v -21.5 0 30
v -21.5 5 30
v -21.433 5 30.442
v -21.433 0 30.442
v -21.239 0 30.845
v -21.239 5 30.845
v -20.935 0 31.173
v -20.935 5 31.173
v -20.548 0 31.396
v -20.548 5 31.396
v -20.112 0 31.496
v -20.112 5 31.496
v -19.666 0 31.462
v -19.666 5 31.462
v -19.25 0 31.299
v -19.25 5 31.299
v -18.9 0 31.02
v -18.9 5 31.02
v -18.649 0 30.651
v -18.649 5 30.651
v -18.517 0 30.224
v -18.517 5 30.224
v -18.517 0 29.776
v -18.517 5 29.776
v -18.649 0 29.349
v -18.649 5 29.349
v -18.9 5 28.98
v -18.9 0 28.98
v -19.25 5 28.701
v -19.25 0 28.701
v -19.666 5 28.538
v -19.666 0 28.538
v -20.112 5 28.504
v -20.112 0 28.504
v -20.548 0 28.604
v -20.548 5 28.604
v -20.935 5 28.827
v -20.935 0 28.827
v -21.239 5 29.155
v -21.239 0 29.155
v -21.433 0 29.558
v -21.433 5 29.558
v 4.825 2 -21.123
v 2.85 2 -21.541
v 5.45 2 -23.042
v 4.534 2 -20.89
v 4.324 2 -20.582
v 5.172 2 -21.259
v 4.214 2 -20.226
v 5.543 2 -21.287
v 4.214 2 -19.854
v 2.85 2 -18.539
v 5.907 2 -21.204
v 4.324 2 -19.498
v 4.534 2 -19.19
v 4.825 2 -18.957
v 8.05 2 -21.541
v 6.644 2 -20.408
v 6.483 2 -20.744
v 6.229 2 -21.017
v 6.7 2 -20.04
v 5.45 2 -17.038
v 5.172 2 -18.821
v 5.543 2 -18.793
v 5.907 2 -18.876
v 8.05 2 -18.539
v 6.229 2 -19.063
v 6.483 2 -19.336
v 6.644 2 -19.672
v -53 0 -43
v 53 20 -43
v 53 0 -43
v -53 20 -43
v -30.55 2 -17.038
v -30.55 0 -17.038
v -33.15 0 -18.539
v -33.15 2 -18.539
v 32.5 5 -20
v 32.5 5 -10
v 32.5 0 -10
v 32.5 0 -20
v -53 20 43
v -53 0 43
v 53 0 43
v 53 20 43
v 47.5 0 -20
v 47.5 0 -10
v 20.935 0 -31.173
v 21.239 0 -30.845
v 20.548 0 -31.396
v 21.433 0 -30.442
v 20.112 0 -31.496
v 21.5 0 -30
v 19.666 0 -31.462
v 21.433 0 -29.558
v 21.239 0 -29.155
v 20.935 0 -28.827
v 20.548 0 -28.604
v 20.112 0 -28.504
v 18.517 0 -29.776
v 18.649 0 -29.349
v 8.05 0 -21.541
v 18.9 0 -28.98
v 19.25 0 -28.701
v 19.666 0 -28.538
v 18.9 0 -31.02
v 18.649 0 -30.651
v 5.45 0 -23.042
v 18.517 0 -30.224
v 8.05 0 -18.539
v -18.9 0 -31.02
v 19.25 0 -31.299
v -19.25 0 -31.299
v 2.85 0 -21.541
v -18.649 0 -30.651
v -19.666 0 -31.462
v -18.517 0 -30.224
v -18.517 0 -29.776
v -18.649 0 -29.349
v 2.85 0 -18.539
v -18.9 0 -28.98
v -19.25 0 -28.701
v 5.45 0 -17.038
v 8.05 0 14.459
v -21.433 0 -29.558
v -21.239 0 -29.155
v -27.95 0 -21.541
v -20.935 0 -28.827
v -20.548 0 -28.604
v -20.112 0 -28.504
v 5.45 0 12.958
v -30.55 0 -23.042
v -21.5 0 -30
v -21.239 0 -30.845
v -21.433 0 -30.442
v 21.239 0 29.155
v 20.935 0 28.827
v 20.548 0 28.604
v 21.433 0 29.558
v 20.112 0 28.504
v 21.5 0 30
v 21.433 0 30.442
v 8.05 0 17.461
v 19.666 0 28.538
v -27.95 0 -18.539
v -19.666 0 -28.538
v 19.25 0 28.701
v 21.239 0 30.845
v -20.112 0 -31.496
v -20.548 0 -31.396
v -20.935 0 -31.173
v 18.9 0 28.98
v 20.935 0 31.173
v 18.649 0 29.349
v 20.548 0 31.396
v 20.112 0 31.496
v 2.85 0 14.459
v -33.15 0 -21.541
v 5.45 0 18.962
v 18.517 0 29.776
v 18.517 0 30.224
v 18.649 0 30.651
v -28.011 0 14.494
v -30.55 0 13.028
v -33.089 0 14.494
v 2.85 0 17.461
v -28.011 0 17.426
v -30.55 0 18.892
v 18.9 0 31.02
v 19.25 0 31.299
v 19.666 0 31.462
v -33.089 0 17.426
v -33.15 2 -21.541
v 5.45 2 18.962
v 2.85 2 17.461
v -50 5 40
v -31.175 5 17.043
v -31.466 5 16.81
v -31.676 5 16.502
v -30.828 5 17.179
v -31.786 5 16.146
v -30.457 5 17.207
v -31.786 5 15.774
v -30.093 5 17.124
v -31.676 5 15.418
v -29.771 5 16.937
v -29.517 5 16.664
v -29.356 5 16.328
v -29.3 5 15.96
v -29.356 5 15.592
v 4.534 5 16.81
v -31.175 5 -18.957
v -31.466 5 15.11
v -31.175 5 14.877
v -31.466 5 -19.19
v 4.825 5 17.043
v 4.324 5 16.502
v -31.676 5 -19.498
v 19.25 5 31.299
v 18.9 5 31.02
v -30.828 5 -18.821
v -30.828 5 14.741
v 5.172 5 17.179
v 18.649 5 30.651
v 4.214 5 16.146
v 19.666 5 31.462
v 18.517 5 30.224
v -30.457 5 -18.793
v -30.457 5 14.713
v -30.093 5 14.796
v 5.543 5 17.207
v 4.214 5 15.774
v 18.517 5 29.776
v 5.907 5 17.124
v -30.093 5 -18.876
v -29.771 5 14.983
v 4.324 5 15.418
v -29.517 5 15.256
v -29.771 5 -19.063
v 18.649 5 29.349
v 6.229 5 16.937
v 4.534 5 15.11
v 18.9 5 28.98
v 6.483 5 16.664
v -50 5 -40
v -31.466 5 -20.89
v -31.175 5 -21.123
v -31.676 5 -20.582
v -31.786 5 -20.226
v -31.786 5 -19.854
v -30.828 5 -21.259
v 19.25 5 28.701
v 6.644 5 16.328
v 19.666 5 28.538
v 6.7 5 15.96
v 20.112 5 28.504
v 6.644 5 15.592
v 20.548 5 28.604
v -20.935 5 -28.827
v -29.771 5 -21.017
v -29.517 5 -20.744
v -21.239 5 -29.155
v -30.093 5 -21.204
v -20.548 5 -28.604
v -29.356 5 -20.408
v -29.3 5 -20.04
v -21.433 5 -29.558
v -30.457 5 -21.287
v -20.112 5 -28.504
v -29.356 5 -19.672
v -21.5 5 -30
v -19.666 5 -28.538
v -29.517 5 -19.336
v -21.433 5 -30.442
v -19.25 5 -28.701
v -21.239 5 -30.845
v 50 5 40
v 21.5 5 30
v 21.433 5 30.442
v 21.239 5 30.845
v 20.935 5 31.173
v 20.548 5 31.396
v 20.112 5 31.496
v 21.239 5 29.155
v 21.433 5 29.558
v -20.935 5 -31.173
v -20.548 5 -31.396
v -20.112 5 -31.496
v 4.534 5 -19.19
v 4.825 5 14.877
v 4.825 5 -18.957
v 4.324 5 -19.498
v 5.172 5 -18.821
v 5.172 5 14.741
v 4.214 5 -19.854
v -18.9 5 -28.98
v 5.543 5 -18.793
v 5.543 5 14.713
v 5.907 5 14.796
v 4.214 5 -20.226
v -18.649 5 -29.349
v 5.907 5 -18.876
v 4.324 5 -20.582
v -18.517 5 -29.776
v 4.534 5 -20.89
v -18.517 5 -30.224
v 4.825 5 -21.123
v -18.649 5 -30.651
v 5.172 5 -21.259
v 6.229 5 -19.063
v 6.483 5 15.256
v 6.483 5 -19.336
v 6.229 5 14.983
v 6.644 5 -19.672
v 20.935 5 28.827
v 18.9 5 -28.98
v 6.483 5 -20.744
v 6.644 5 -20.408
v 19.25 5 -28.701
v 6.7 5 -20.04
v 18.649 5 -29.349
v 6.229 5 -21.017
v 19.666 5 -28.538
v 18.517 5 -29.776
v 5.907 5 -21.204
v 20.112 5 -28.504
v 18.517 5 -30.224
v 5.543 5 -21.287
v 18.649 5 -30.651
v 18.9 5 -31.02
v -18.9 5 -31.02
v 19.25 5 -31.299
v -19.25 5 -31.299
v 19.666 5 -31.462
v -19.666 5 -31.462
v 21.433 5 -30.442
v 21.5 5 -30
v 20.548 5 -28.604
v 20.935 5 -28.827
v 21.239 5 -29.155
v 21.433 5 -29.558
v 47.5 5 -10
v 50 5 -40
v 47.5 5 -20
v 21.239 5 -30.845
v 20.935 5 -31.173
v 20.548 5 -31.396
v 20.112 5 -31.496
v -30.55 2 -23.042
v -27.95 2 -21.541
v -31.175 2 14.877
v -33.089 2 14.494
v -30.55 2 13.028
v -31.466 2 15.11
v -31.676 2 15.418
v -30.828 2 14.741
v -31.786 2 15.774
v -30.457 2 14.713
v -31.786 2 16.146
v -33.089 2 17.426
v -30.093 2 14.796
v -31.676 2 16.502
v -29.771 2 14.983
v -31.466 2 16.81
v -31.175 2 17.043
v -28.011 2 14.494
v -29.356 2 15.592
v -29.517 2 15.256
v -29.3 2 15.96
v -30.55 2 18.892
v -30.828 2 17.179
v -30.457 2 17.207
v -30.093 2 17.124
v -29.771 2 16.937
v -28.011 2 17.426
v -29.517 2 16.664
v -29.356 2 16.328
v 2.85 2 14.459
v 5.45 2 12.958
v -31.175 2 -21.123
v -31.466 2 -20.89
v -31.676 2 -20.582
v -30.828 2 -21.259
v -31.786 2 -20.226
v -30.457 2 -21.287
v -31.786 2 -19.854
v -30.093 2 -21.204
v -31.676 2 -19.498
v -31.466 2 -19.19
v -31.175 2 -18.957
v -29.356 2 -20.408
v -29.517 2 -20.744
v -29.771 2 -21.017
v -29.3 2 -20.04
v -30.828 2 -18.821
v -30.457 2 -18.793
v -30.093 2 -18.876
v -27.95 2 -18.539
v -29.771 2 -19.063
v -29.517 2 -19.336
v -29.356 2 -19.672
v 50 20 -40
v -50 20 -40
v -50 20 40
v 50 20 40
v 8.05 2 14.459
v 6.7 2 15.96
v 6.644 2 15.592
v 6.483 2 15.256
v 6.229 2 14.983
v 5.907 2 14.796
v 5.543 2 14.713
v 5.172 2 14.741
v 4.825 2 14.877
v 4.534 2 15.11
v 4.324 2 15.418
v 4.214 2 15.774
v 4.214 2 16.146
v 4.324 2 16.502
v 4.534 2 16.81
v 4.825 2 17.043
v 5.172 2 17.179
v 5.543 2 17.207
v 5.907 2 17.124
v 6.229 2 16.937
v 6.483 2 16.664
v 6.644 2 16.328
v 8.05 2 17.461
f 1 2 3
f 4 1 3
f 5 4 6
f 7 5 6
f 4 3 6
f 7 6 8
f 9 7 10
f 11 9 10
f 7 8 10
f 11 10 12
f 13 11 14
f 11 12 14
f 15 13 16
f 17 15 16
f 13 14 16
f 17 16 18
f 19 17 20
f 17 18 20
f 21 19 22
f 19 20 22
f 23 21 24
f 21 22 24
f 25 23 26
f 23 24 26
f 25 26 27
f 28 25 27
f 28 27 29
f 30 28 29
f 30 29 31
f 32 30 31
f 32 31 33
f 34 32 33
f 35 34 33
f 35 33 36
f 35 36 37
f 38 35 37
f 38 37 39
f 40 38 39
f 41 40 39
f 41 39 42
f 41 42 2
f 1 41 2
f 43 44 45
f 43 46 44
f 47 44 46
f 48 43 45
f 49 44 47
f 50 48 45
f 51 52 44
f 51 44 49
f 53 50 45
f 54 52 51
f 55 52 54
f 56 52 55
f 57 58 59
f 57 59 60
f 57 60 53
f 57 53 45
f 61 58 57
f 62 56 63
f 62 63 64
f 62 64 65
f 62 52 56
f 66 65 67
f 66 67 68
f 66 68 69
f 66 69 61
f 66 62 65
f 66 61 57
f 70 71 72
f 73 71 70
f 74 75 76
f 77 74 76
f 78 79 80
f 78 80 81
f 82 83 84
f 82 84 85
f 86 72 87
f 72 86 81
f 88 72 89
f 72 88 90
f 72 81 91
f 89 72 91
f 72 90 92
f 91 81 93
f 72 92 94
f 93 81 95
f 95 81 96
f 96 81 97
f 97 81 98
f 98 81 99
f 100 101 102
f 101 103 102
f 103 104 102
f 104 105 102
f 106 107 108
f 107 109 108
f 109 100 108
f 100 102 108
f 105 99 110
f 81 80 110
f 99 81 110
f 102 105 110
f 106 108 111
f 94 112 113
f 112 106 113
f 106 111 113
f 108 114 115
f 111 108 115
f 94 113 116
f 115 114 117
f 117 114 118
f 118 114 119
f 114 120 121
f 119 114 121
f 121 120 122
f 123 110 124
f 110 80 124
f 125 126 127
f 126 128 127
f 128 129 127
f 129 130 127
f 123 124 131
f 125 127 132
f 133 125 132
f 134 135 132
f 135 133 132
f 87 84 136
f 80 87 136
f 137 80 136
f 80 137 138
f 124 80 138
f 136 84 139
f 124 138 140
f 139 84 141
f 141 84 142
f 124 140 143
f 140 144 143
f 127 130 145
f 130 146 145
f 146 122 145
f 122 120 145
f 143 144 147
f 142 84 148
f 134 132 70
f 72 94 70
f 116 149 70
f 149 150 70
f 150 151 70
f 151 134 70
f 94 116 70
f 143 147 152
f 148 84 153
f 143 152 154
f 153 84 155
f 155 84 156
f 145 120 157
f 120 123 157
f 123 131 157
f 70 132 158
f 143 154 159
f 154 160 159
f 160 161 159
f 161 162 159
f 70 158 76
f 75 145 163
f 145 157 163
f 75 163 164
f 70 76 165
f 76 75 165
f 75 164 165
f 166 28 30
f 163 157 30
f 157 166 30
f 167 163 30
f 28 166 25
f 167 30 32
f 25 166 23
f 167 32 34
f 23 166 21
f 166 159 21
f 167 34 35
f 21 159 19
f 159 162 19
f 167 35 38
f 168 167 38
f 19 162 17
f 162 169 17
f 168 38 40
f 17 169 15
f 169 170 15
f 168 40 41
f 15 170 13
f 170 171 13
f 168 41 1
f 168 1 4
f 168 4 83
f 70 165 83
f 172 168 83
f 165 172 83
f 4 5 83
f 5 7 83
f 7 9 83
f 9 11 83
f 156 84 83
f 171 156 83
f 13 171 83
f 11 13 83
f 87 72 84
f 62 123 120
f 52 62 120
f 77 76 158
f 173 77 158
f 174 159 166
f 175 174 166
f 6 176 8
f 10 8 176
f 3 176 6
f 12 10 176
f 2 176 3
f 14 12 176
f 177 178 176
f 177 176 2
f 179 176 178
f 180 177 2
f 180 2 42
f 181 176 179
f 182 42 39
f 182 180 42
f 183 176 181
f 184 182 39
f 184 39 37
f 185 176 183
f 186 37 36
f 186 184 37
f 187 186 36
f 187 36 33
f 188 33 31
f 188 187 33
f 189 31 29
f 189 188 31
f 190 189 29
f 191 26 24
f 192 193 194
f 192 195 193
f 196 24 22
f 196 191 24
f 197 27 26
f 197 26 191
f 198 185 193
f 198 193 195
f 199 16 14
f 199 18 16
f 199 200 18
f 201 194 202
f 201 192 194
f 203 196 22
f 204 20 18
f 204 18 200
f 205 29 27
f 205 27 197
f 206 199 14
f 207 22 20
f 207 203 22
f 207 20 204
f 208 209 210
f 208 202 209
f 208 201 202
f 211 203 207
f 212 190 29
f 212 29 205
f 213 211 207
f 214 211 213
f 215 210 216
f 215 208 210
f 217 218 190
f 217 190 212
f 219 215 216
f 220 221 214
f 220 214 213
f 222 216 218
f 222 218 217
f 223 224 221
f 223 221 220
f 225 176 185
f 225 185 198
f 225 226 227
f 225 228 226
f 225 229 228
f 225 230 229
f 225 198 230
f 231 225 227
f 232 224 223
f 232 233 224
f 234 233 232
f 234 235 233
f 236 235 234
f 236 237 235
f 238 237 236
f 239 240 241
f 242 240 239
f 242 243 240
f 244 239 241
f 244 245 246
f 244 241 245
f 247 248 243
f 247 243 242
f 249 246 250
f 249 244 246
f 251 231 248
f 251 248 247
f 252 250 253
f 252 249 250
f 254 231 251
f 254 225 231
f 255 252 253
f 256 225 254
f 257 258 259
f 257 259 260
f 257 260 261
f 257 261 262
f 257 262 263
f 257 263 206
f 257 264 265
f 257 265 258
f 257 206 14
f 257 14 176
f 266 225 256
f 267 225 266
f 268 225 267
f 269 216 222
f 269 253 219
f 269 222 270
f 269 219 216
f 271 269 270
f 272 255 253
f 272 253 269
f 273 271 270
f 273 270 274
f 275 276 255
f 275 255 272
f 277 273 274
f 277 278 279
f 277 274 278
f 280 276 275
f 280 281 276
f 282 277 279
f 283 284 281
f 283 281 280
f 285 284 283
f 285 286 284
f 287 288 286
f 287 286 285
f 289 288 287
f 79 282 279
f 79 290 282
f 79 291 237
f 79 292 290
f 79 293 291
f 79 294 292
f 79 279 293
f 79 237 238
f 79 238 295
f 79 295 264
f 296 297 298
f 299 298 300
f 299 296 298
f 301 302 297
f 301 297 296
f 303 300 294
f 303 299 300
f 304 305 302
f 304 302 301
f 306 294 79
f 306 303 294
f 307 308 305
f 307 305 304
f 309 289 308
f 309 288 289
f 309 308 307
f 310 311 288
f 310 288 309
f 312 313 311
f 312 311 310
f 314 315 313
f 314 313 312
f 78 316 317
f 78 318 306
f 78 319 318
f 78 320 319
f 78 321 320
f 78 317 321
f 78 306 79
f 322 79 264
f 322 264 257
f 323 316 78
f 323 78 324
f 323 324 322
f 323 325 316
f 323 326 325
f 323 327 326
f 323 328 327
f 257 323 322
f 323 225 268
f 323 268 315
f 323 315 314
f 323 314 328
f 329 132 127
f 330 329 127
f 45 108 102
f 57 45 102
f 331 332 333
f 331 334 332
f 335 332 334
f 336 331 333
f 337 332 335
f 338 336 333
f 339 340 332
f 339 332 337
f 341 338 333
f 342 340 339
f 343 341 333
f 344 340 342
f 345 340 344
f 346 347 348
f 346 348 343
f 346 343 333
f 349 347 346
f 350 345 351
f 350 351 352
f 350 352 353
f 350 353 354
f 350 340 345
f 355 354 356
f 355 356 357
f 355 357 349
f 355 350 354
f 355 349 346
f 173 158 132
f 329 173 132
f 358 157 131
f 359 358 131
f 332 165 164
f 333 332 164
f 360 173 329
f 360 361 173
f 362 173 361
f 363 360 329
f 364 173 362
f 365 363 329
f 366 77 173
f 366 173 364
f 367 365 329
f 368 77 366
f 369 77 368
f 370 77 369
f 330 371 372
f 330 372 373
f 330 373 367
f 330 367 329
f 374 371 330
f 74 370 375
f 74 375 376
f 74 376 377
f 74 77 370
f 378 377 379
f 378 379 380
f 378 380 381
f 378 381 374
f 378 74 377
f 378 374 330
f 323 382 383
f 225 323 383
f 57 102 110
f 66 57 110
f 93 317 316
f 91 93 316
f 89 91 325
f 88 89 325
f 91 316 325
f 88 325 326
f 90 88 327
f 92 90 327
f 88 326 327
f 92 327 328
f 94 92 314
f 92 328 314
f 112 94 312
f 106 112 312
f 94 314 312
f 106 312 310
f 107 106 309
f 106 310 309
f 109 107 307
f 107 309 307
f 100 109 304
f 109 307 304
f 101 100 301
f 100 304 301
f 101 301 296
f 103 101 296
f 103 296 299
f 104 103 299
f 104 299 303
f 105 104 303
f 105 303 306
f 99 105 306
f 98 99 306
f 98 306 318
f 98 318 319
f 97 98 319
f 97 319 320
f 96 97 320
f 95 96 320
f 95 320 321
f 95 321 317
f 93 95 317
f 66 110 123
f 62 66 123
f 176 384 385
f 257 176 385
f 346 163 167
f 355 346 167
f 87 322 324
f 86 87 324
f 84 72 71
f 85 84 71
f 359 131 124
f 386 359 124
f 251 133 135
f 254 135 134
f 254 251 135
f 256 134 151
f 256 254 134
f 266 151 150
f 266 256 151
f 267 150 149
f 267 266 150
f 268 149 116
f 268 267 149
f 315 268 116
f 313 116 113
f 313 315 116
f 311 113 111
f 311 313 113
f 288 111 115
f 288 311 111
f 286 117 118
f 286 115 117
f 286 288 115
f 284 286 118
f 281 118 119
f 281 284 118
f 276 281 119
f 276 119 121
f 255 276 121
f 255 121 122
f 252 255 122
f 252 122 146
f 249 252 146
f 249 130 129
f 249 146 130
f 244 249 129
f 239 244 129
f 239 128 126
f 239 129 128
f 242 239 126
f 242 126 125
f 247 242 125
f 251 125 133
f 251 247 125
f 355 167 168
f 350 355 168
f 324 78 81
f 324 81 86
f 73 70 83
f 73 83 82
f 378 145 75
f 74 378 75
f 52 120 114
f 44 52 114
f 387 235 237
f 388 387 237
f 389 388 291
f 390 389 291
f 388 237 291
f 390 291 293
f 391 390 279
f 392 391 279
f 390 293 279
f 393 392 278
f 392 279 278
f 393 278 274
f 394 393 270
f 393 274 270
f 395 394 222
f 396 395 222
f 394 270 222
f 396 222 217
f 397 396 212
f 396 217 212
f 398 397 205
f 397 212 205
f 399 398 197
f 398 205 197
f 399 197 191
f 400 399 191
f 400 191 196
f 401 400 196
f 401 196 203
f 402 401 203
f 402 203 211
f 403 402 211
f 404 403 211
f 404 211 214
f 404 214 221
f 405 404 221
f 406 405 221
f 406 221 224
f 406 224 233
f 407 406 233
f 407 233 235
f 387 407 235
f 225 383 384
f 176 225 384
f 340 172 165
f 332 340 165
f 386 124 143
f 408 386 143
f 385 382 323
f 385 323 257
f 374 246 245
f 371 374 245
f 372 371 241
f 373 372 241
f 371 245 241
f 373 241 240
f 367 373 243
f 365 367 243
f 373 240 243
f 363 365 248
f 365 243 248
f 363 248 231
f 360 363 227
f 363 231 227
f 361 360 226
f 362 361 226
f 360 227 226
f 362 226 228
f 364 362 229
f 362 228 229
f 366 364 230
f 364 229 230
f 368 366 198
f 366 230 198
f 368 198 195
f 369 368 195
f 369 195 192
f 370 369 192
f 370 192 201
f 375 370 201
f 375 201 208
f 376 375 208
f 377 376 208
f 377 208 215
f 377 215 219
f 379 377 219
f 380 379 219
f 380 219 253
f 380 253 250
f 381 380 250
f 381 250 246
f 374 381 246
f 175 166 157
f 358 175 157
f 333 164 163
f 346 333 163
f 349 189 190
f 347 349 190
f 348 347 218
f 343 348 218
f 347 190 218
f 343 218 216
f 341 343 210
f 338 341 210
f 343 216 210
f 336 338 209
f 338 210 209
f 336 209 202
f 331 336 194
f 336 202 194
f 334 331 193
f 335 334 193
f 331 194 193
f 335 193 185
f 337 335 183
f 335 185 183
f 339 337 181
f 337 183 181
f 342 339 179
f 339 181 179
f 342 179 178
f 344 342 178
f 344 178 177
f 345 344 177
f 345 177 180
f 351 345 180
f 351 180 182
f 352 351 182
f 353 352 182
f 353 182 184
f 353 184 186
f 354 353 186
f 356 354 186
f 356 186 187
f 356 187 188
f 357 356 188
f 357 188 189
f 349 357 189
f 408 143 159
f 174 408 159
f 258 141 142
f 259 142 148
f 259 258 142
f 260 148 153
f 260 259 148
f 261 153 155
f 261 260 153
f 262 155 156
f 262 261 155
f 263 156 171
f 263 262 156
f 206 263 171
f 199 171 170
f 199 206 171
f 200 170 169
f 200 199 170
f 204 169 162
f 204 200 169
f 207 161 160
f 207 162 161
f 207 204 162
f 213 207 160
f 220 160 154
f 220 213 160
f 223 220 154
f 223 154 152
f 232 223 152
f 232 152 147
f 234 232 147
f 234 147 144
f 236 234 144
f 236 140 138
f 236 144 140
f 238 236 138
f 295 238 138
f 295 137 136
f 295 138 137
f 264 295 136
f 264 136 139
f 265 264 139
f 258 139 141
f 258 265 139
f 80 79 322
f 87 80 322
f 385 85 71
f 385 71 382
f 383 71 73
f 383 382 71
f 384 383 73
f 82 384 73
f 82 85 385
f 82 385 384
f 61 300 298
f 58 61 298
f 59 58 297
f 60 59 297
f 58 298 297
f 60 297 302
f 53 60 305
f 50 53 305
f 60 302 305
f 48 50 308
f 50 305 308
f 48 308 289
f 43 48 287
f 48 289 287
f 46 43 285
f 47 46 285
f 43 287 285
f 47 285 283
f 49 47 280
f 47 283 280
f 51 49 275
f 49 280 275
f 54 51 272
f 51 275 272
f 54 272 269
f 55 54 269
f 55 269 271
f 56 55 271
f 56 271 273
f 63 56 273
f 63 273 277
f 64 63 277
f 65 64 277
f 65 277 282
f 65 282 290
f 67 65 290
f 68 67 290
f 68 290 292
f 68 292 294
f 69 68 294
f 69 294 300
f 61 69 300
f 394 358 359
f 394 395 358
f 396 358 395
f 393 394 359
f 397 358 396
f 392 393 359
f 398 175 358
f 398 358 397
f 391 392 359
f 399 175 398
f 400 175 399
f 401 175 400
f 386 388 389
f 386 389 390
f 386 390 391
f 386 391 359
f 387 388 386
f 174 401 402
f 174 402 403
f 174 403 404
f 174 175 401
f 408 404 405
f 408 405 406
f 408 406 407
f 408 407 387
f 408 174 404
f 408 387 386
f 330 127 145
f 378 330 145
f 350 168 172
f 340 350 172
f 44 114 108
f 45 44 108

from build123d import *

# Parameters (mm, degrees)
SKETCH_1_W               = 100
SKETCH_1_H               = 80
EXTRUDE_1_DEPTH          = 5
SKETCH_2_R               = 1.5
CUT_EXTRUDE_1_DEPTH      = 6
MIRROR_2_COPY_1_SKETCH_R = 1.5
MIRROR_2_COPY_1_DEPTH    = 6
SKETCH_4_W               = 100
SKETCH_4_H               = 20
EXTRUDE_2_DEPTH          = 3
SKETCH_5_W               = 83
SKETCH_5_H               = 20
EXTRUDE_3_DEPTH          = 3
SKETCH_6_W               = 106
SKETCH_6_H               = 20
EXTRUDE_4_DEPTH          = 3
SKETCH_7_R               = 1.25
CUT_EXTRUDE_2_DEPTH      = 6
CUT_EXTRUDE_3_DEPTH      = 2
SKETCH_9_W               = 15
SKETCH_9_H               = 10
CUT_EXTRUDE_4_DEPTH      = 6


with BuildPart() as part:
    # 草图1 → 凸台-拉伸1 (new body)
    with BuildSketch(Plane(origin=(0, 0, 0), x_dir=(1, 0, 0), z_dir=(0, 1, 0))):
        Rectangle(SKETCH_1_W, SKETCH_1_H)
    extrude(amount=EXTRUDE_1_DEPTH)

    # 草图2 → 切除-拉伸1 (cut, through all)
    with BuildSketch(Plane(origin=(0, 5, 0), x_dir=(1, 0, 0), z_dir=(0, 1, 0))):
        with Locations((20, 30)):
            Circle(SKETCH_2_R)
    cut_extrude_1 = extrude(amount=-CUT_EXTRUDE_1_DEPTH, mode=Mode.SUBTRACT)

    # 镜向1: 切除-拉伸1 across plane
    add(cut_extrude_1.mirror(Plane.ZY), mode=Mode.SUBTRACT)

    # 镜向2: 切除-拉伸1 across plane
    add(cut_extrude_1.mirror(Plane.XY), mode=Mode.SUBTRACT)

    # 镜向2 copy 1 sketch → 镜向2 copy 1 (cut, through all)
    with BuildSketch(Plane(origin=(0, 5, 0), x_dir=(-1, 0, 0), z_dir=(0, 1, 0))):
        with Locations((20, 30)):
            Circle(MIRROR_2_COPY_1_SKETCH_R)
    extrude(amount=-MIRROR_2_COPY_1_DEPTH, mode=Mode.SUBTRACT)

    # 草图4 → 凸台-拉伸2 (add)
    with BuildSketch(Plane.XY.offset(40)):
        with Locations((0, 10)):
            Rectangle(SKETCH_4_W, SKETCH_4_H)
    extrude(amount=EXTRUDE_2_DEPTH)

    # 草图5 → 凸台-拉伸3 (add)
    with BuildSketch(Plane.ZY.offset(50)):
        with Locations((1.5, 10)):
            Rectangle(SKETCH_5_W, SKETCH_5_H)
    extrude_3 = extrude(amount=EXTRUDE_3_DEPTH)

    # 镜向3: 凸台-拉伸3 across plane
    add(extrude_3.mirror(Plane.ZY))

    # 草图6 → 凸台-拉伸4 (add)
    with BuildSketch(Plane(origin=(0, 0, -40), x_dir=(-1, 0, 0), z_dir=(0, 0, -1))):
        with Locations((0, 10)):
            Rectangle(SKETCH_6_W, SKETCH_6_H)
    extrude(amount=EXTRUDE_4_DEPTH)

    # 草图7 → 切除-拉伸2 (cut, through all)
    with BuildSketch(Plane(origin=(0, 5, 0), x_dir=(1, 0, 0), z_dir=(0, 1, 0))):
        with Locations((5.45, 20.04)):
            Circle(SKETCH_7_R)
        with Locations((-30.55, 20.04)):
            Circle(SKETCH_7_R)
        with Locations((-30.55, -15.96)):
            Circle(SKETCH_7_R)
        with Locations((5.45, -15.96)):
            Circle(SKETCH_7_R)
    extrude(amount=-CUT_EXTRUDE_2_DEPTH, mode=Mode.SUBTRACT)

    # 草图8 → 切除-拉伸3 (cut)
    with BuildSketch(Plane.XZ):
        Polygon((-28.01123046, 17.425759277), (-30.55, 18.891518554), (-33.08876954, 17.425759277), (-33.08876954, 14.494240723), (-30.55, 13.028481446), (-28.01123046, 14.494240723), align=None)
        Polygon((-30.55, -17.0377786), (-33.15, -18.5388893), (-33.15, -21.5411107), (-30.55, -23.0422214), (-27.95, -21.5411107), (-27.95, -18.5388893), align=None)
        Polygon((5.45, 18.9622214), (2.85, 17.4611107), (2.85, 14.4588893), (5.45, 12.9577786), (8.05, 14.4588893), (8.05, 17.4611107), align=None)
        Polygon((5.45, -17.0377786), (2.85, -18.5388893), (2.85, -21.5411107), (5.45, -23.0422214), (8.05, -21.5411107), (8.05, -18.5388893), align=None)
    extrude(amount=-CUT_EXTRUDE_3_DEPTH, mode=Mode.SUBTRACT)

    # 草图9 → 切除-拉伸4 (cut, through all)
    with BuildSketch(Plane(origin=(0, 5, 0), x_dir=(1, 0, 0), z_dir=(0, 1, 0))):
        with Locations((40, 15)):
            Rectangle(SKETCH_9_W, SKETCH_9_H)
    extrude(amount=-CUT_EXTRUDE_4_DEPTH, mode=Mode.SUBTRACT)


solid = part.part
